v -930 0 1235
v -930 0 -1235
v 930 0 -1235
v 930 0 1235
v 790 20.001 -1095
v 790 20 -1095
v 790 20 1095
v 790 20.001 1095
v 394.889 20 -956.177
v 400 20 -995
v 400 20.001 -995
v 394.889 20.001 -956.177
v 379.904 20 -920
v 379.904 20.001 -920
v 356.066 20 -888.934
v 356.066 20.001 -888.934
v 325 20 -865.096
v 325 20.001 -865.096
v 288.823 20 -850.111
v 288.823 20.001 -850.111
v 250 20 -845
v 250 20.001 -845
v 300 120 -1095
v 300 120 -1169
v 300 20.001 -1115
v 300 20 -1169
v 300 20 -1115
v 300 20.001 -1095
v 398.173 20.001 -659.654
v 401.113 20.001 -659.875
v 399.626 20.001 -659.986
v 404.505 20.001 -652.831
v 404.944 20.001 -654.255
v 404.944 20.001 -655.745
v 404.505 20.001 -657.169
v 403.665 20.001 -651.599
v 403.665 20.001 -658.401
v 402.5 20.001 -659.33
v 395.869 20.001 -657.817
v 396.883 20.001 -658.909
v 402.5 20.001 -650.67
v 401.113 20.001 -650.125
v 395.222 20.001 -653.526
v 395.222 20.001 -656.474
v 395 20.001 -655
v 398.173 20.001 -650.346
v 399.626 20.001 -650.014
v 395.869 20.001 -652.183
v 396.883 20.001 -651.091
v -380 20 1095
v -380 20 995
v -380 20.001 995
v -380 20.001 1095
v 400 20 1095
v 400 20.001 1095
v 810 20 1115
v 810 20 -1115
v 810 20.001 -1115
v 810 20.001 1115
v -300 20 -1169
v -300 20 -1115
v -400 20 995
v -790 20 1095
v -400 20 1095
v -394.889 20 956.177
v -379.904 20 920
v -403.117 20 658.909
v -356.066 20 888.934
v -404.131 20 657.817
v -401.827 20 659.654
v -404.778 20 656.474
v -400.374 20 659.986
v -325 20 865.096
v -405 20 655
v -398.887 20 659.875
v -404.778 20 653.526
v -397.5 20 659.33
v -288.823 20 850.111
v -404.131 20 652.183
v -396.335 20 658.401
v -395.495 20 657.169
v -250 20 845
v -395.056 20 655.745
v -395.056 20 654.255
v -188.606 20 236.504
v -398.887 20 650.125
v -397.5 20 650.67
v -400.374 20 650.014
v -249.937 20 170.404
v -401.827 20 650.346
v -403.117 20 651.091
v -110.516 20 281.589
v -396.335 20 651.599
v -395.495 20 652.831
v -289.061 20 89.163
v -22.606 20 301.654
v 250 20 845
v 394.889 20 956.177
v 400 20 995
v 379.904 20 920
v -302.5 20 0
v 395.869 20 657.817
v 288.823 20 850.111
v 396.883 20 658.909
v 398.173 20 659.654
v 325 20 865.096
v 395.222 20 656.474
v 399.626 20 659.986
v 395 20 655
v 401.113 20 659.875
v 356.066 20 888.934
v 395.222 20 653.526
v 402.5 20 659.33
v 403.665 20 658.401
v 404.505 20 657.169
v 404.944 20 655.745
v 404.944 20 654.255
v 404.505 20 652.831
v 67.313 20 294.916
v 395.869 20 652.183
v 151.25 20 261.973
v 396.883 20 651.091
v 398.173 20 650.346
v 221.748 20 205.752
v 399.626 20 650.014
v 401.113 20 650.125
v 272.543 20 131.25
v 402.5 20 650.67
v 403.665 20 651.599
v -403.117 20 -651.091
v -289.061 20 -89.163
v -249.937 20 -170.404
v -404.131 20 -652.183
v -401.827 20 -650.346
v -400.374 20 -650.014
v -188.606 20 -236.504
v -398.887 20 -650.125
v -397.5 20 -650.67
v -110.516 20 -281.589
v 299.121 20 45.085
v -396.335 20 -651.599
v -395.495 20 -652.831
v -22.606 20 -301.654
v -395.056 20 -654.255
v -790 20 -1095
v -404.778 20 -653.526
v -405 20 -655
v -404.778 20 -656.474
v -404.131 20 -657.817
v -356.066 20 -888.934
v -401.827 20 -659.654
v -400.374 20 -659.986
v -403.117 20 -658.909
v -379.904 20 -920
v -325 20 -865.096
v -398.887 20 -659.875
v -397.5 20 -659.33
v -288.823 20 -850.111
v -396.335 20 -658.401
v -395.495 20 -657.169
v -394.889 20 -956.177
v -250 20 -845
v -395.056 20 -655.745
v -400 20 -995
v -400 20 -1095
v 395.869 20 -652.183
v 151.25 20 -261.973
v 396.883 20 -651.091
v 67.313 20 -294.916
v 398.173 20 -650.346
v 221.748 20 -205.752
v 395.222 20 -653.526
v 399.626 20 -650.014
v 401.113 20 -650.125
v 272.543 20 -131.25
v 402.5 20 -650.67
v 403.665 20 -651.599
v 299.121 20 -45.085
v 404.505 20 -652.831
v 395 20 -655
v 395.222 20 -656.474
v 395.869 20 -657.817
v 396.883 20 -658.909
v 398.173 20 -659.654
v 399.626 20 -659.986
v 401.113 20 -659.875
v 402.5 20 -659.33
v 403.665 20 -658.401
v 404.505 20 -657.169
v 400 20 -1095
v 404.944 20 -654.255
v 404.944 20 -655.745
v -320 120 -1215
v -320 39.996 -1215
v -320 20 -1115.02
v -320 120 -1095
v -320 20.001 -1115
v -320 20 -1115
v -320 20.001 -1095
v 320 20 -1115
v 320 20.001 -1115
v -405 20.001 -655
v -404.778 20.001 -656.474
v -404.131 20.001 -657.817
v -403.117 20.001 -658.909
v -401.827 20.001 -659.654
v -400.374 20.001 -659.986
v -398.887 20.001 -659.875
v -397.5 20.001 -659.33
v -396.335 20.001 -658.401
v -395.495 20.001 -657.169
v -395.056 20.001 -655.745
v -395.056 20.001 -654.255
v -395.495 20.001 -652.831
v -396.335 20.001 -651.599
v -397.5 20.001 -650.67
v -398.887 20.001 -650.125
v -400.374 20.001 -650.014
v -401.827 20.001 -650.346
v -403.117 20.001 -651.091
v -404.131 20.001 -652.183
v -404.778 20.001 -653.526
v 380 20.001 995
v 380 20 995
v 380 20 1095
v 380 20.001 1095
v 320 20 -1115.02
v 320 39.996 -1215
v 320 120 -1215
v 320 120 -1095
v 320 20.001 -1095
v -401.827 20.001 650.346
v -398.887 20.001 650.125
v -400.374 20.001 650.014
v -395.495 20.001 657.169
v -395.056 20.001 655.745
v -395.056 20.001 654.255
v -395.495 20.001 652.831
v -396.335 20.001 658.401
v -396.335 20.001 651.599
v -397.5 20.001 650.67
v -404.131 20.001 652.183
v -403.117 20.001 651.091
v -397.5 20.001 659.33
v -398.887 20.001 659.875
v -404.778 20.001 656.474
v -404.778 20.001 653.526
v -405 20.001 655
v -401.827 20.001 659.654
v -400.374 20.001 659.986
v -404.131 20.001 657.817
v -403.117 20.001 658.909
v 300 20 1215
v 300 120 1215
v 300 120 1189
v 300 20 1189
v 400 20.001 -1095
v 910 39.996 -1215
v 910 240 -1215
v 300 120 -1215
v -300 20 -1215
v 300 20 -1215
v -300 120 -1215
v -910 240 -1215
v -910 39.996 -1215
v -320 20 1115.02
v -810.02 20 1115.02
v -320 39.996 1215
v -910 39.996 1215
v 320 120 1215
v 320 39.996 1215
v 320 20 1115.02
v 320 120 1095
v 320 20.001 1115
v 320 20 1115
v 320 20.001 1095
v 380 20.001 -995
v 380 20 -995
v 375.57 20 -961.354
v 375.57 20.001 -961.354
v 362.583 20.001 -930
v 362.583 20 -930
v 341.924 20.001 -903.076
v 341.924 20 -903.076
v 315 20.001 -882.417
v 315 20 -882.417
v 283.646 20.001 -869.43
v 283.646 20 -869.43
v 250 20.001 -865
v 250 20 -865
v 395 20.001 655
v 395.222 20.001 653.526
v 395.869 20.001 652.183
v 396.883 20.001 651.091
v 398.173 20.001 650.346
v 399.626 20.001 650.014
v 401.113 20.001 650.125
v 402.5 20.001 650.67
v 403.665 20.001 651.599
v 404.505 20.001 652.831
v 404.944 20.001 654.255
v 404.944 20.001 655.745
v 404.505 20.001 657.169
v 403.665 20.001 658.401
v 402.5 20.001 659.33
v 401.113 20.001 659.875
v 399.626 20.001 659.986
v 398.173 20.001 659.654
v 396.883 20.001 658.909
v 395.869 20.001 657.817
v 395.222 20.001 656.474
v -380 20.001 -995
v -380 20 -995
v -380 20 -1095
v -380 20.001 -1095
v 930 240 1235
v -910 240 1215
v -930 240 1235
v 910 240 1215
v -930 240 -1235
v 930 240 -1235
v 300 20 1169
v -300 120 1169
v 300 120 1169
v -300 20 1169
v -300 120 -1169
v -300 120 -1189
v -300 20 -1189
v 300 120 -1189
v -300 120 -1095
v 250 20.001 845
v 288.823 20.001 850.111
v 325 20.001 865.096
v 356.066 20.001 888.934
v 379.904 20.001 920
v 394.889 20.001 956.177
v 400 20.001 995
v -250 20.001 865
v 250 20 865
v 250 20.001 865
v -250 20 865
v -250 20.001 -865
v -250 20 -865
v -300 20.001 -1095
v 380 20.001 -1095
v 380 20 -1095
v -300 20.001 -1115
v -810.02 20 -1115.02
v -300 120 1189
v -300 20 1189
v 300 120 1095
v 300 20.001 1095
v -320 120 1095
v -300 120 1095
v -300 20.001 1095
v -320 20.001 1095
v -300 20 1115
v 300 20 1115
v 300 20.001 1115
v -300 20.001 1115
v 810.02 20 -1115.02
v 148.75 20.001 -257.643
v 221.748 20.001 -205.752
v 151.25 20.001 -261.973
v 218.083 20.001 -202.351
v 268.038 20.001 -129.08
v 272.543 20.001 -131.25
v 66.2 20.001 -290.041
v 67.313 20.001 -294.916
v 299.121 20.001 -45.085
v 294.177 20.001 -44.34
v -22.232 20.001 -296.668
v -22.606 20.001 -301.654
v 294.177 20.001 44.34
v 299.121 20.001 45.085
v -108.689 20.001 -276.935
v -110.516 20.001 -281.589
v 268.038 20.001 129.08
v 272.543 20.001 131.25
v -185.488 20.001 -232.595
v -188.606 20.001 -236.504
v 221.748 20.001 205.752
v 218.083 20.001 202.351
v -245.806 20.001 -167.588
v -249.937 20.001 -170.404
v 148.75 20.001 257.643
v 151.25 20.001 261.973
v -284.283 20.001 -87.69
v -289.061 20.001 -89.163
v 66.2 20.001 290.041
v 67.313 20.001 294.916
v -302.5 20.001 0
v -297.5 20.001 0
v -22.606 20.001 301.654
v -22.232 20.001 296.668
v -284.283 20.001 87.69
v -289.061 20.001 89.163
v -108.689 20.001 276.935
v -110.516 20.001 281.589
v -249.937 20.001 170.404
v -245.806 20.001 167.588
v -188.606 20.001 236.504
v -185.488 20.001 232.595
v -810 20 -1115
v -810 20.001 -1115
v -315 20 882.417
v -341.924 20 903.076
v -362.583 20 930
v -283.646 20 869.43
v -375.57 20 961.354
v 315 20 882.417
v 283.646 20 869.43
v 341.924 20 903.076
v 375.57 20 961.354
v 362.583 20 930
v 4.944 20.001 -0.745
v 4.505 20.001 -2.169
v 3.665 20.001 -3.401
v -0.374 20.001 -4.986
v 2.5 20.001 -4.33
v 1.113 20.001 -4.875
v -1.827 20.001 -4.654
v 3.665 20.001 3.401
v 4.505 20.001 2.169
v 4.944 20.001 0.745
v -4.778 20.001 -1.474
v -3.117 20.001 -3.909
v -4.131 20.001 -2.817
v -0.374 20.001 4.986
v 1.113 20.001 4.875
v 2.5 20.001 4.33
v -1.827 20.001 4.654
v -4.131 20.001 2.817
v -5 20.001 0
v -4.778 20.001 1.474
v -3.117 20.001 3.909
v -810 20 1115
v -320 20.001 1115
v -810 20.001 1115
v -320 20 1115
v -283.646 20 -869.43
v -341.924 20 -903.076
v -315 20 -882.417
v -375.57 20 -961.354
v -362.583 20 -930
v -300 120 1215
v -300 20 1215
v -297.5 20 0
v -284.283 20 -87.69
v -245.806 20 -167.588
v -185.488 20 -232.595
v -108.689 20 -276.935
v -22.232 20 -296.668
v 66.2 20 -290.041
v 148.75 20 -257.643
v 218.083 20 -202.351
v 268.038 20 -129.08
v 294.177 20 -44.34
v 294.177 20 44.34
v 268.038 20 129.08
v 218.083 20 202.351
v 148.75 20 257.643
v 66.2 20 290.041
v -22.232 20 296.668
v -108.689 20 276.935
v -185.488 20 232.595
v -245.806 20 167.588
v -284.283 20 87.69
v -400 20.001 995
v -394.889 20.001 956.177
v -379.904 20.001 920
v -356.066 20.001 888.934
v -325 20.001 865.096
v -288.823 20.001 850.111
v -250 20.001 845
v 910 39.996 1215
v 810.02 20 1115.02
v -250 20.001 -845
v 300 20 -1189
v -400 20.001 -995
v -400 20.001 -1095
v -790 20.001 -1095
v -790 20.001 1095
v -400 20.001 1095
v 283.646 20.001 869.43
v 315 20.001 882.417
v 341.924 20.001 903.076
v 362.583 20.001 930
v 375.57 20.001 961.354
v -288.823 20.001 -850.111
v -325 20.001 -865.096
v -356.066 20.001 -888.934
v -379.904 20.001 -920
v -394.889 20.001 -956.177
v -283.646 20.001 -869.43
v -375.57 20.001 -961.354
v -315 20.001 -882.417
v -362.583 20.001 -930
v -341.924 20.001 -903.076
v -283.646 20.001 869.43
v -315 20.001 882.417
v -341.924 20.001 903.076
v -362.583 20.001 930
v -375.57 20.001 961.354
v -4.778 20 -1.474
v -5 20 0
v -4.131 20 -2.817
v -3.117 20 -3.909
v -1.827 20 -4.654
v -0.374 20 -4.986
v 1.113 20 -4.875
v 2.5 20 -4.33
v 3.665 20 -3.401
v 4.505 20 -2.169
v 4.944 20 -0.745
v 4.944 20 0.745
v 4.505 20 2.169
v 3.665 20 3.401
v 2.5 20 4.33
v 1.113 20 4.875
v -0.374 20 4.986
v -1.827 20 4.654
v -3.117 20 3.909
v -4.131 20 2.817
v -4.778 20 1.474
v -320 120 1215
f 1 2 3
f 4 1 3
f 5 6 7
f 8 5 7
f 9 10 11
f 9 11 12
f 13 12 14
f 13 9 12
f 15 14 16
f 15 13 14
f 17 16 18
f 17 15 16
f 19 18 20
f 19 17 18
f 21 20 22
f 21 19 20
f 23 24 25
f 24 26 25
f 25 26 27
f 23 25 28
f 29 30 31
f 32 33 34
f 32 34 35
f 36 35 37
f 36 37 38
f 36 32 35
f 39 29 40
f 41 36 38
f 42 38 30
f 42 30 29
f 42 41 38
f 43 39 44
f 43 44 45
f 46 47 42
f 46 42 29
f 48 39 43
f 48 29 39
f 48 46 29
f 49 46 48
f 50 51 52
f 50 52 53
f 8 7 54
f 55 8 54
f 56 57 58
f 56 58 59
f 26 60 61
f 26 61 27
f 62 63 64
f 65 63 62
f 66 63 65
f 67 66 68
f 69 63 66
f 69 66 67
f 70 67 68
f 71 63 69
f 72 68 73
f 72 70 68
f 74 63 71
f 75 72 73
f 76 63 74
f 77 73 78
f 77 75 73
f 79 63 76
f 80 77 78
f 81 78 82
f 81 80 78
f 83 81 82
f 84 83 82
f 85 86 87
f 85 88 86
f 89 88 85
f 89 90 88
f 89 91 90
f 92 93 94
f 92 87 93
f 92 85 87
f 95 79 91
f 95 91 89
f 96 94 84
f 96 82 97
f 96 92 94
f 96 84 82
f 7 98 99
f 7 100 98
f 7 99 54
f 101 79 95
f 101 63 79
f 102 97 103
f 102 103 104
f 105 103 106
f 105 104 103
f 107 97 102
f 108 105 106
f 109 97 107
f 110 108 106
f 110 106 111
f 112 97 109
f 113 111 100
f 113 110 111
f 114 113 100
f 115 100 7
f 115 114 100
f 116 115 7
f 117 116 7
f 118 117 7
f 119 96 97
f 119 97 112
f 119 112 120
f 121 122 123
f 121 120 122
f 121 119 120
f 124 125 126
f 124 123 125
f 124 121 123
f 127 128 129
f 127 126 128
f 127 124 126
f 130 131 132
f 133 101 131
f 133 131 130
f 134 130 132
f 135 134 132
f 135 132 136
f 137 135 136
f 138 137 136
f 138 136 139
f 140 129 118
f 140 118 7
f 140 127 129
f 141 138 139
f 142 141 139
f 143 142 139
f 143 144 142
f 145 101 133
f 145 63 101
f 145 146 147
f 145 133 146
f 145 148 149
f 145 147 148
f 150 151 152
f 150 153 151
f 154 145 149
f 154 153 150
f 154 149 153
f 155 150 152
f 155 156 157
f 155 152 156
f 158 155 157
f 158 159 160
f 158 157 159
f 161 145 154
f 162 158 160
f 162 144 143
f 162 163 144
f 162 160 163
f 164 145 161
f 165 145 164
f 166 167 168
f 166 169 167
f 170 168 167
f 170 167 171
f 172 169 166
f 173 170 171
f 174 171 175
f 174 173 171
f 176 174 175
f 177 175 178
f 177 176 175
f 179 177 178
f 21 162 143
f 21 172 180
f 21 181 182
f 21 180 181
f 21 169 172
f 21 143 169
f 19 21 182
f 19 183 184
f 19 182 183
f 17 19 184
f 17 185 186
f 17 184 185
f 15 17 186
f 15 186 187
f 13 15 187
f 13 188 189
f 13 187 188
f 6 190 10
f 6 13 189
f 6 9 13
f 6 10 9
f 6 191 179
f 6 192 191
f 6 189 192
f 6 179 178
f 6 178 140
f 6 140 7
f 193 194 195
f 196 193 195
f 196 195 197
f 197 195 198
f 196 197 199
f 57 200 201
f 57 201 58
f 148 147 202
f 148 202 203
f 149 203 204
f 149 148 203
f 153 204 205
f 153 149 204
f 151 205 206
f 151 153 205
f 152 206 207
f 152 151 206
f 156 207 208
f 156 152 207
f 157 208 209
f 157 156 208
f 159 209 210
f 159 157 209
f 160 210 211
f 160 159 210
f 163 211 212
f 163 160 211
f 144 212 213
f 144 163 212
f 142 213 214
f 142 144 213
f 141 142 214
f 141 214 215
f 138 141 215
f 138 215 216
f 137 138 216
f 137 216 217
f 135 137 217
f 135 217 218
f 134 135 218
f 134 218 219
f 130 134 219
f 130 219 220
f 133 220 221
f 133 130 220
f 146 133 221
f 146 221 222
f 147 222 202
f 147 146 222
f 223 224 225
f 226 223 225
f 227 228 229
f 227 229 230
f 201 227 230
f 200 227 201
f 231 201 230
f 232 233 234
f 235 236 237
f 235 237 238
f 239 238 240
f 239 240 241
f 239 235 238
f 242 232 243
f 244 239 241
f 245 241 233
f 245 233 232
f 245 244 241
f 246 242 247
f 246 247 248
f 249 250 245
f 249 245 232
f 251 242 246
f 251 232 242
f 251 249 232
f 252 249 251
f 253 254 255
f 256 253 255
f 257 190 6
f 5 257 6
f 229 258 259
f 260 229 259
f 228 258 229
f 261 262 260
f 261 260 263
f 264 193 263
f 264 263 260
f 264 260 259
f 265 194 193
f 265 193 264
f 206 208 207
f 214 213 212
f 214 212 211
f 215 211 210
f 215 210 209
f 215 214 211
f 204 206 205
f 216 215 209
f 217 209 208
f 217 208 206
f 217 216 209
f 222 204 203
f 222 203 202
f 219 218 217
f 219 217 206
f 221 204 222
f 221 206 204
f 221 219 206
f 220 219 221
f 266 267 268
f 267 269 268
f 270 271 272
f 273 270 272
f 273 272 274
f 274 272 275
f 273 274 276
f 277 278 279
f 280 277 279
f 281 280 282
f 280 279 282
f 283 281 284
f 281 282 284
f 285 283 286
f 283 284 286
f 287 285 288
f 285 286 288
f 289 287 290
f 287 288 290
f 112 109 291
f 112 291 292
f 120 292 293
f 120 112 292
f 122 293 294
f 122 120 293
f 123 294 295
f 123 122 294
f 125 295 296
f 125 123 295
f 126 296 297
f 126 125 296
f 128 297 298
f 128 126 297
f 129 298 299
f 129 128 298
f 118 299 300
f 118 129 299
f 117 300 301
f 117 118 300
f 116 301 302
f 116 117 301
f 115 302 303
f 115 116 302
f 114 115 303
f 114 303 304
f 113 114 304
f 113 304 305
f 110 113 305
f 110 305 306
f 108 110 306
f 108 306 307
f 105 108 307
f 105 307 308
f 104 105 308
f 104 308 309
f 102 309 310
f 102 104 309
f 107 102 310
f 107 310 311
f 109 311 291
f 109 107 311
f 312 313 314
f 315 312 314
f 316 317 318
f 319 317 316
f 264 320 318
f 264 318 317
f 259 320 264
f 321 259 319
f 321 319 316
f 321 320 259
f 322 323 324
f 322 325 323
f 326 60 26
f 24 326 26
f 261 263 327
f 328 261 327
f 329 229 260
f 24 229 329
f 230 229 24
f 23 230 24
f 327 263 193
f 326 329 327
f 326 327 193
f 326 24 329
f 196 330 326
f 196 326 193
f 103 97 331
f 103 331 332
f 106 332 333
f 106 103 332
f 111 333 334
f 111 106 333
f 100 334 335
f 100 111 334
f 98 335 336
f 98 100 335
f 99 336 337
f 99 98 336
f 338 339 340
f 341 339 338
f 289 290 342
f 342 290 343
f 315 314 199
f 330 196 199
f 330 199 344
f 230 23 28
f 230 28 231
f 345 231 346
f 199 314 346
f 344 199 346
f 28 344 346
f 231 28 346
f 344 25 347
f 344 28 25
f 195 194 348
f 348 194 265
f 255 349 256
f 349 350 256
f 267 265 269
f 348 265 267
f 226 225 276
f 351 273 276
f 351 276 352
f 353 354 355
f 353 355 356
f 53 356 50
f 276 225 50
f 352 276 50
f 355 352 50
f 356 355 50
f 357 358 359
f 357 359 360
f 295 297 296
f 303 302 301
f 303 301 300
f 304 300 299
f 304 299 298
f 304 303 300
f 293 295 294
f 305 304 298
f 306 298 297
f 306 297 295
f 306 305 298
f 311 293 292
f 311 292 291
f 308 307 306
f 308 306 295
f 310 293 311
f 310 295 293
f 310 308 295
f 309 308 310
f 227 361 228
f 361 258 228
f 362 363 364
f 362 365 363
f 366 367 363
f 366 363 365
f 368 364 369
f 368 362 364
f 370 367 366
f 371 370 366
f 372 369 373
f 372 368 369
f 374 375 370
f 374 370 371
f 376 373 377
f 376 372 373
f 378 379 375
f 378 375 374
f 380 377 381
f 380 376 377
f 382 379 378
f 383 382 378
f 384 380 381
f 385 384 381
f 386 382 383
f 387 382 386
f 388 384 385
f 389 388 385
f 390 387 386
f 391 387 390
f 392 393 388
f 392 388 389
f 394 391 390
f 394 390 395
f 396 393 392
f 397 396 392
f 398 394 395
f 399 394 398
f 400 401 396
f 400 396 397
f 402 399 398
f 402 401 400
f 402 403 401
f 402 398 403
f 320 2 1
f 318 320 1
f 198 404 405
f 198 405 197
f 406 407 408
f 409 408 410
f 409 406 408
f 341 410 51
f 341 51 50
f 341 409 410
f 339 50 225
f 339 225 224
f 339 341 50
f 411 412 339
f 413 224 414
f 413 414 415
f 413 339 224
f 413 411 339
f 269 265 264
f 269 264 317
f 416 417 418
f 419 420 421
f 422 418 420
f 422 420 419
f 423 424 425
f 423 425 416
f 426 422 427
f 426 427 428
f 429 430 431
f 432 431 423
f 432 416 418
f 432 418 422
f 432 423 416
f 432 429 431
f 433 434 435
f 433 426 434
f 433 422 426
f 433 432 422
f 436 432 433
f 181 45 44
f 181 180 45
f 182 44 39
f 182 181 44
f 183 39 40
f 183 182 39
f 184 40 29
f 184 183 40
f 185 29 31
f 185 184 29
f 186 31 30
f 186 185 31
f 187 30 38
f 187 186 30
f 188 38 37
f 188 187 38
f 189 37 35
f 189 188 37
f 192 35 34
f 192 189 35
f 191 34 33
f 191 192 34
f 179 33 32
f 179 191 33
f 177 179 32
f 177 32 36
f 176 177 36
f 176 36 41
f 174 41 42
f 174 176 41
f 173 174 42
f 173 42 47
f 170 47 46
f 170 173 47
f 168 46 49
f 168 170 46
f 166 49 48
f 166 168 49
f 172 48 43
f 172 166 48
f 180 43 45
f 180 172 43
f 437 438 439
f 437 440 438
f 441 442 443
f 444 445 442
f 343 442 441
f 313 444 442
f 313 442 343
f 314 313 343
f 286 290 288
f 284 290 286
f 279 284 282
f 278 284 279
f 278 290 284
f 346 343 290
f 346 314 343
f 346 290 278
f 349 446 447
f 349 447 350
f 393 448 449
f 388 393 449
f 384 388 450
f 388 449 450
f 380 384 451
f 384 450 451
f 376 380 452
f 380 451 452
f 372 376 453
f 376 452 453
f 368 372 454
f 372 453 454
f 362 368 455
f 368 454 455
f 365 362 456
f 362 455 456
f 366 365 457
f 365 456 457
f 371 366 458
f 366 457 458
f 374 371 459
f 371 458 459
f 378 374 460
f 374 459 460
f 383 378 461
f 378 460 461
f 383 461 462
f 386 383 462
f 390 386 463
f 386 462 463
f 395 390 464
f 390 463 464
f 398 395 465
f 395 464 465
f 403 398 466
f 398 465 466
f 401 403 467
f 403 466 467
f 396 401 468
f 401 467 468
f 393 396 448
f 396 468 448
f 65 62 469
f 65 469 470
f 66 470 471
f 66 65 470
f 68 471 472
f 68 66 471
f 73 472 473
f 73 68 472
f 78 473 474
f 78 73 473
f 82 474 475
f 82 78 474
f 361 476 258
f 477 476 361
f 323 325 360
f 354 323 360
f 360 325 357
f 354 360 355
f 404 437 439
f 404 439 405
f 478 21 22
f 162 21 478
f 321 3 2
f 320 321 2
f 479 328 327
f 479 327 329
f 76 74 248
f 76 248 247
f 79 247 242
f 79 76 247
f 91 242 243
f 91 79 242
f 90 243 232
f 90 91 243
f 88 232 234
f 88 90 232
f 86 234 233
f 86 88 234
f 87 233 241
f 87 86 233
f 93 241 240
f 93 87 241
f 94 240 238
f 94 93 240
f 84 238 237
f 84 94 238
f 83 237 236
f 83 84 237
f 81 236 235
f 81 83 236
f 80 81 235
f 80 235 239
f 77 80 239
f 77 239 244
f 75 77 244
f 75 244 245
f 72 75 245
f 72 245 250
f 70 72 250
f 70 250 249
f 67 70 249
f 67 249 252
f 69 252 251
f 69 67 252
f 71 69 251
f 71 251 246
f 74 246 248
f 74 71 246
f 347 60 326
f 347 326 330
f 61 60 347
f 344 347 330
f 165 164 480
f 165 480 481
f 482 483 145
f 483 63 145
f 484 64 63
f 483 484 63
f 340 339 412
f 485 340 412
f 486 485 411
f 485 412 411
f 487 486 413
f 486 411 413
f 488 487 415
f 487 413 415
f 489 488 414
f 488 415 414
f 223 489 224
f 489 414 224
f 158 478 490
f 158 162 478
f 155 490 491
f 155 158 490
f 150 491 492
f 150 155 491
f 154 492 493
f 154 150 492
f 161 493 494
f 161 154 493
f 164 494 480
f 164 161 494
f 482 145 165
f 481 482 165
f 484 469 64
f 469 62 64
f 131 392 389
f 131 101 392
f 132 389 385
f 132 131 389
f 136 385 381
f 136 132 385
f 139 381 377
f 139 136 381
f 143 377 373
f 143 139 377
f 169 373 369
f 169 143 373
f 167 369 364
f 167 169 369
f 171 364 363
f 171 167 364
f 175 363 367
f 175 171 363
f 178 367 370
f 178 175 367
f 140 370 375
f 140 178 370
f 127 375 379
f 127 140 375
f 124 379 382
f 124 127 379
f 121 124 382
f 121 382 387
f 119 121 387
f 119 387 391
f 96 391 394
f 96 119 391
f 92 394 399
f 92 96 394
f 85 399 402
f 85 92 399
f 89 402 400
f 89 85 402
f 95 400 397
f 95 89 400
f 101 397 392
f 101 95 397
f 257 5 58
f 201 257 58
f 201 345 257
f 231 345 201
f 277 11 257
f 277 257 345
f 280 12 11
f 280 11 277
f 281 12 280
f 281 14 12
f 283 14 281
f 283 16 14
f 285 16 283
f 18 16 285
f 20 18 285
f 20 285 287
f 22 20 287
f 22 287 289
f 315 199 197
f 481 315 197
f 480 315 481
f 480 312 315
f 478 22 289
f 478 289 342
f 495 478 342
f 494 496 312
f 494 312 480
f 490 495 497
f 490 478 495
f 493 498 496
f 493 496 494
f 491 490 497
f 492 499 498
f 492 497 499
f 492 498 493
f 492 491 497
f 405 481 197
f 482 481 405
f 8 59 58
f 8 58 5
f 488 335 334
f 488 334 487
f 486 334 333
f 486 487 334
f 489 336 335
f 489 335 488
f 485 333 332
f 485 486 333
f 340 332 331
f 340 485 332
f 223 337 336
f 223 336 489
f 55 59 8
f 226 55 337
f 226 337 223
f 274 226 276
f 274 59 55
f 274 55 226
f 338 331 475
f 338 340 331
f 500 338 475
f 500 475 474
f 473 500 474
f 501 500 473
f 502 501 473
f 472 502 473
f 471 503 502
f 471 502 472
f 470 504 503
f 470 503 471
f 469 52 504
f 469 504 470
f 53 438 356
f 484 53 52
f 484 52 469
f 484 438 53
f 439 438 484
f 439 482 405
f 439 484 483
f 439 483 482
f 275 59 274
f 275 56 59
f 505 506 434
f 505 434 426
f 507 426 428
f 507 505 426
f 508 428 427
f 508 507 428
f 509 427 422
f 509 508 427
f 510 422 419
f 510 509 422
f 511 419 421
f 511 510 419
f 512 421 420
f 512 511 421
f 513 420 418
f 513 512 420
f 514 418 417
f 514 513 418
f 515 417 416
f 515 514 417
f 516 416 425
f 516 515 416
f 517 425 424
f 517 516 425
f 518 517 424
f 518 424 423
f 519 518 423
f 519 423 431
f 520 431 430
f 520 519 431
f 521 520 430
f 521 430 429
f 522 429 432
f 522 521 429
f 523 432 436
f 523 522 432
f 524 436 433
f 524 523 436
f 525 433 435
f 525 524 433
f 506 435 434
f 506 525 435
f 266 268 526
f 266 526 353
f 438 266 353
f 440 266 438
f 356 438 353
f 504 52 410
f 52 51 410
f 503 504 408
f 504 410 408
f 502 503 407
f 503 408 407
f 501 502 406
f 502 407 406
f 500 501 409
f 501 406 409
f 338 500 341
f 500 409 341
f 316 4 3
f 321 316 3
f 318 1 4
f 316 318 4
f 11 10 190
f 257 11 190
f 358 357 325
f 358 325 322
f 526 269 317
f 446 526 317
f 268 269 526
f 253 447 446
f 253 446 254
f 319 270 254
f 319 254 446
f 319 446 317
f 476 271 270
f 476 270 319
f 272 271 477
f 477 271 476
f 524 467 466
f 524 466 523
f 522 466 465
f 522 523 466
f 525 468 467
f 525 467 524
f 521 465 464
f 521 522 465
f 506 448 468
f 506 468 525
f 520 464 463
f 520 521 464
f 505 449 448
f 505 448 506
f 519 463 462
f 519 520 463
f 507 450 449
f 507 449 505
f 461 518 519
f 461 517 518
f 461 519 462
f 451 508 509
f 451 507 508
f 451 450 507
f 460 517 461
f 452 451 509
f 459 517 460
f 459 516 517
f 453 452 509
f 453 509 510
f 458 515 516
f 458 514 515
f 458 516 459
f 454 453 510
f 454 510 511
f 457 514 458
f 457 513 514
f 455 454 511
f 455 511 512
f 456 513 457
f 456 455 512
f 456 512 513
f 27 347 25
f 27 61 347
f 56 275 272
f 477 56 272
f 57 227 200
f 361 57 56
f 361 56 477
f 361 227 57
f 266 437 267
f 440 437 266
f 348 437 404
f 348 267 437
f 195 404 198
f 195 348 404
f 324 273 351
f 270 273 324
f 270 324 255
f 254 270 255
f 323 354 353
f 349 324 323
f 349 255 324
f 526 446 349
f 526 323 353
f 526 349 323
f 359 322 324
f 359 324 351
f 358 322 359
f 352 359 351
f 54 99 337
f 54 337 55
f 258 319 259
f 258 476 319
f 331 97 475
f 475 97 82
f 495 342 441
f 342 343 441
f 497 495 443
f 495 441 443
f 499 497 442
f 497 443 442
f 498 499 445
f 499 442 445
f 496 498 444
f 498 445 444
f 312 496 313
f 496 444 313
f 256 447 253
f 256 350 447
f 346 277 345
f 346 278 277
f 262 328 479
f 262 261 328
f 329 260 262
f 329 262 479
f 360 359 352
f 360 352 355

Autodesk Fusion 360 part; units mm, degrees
sketch "スケッチ1" plane through (0, 0, 0) normal (0, 1, 0) x (1, 0, 0)
  line L0 (-910, -1215) -> (910, -1215)
  line L1 (910, -1215) -> (910, 1215)
  line L2 (910, 1215) -> (-910, 1215)
  line L3 (-910, 1215) -> (-910, -1215)
  line L4 (930, 1235) -> (-930, 1235)
  line L5 (-930, 1235) -> (-930, -1235)
  line L6 (-930, -1235) -> (930, -1235)
  line L7 (930, -1235) -> (930, 1235)
extrude "押し出し1" add sketch "スケッチ1" along normal blind 20 contours L0 L1 L2 L3 | L4 L5 L6 L7
extrude "押し出し2" add sketch "スケッチ1" along normal blind 240
sketch "スケッチ2" plane through (0, 20, 0) normal (0, 1, 0) x (-1, 0, 0)
  line L0 (910, 1215) -> (-910, 1215)
  line L1 (-910, 1215) -> (-910, -1215)
  line L2 (-910, -1215) -> (910, -1215)
  line L3 (910, -1215) -> (910, 1215)
  line L4 (910, -1215) -> (-910, -1215)
  line L5 (-910, -1215) -> (-910, 1215)
  line L6 (-910, 1215) -> (910, 1215)
  line L7 (910, 1215) -> (910, -1215)
  line L8 (-810, -1115) -> (-810, 1115)
  line L9 (810, 1115) -> (810, -1115)
  line L10 (790, -1095) -> (-790, -1095)
  line L11 (-790, -1095) -> (-790, 1095)
  line L12 (-790, 1095) -> (790, 1095)
  line L13 (790, 1095) -> (790, -1095)
  circle A0 centre (400, -655) radius 5
  circle A1 centre (-400, -655) radius 5
  circle A2 centre (400, 655) radius 5
  circle A3 centre (-400, 655) radius 5
  circle A4 centre (0, 0) radius 5
  circle A5 centre (0, 0) radius 302.5
  circle A6 centre (0, 0) radius 297.5
  line L14 (-250, 845) -> (250, 845)
  line L15 (400, 995) -> (400, 1095)
  line L16 (-400, 995) -> (-400, 1095)
  arc A7 (250, 845) -> (400, 995) centre (250, 995) ccw
  arc A8 (-400, 995) -> (-250, 845) centre (-250, 995) ccw
  line L17 (-380, 995) -> (-380, 1095)
  arc A9 (-380, 995) -> (-250, 865) centre (-250, 995) ccw
  line L18 (-250, 865) -> (250, 865)
  arc A10 (250, 865) -> (380, 995) centre (250, 995) ccw
  line L19 (380, 995) -> (380, 1095)
  line L20 (300, 1169) -> (-300, 1169)
  line L21 (320, 1215) -> (320, 1095)
  line L22 (300, 1189) -> (-300, 1189)
  line L23 (-320, 1215) -> (-320, 1095)
  line L24 (-300, 1215) -> (-300, 1189)
  line L25 (-300, 1169) -> (-300, 1095)
  line L26 (300, 1215) -> (300, 1189)
  line L27 (300, 1169) -> (300, 1095)
  line L28 (320, 1115) -> (810, 1115)
  line L29 (-810, 1115) -> (-320, 1115)
  line L30 (-300, 1115) -> (300, 1115)
  line L31 (300, -1215) -> (300, -1189)
  line L32 (300, -1189) -> (-300, -1189)
  line L33 (-300, -1215) -> (-300, -1189)
  line L34 (300, -1169) -> (300, -1095)
  line L35 (-300, -1169) -> (-300, -1095)
  line L36 (300, -1169) -> (-300, -1169)
  line L37 (320, -1215) -> (320, -1095)
  line L38 (-320, -1215) -> (-320, -1095)
  line L39 (810, -1115) -> (320, -1115)
  line L40 (300, -1115) -> (-300, -1115)
  line L41 (-320, -1115) -> (-810, -1115)
  line L42 (380, -995) -> (380, -1095)
  arc A11 (380, -995) -> (250, -865) centre (250, -995) ccw
  line L43 (-250, -865) -> (250, -865)
  arc A12 (-250, -865) -> (-380, -995) centre (-250, -995) ccw
  line L44 (-380, -995) -> (-380, -1095)
  line L45 (400, -995) -> (400, -1095)
  arc A13 (400, -995) -> (250, -845) centre (250, -995) ccw
  line L46 (-250, -845) -> (250, -845)
  arc A14 (-250, -845) -> (-400, -995) centre (-250, -995) ccw
  line L47 (-400, -995) -> (-400, -1095)
extrude "押し出し3" add sketch "スケッチ2" along normal blind 100 contours L0 L6 L12 L20 L21 L22 L23 L24 L25 L26 L27 | L2 L4 L10 L31 L32 L33 L34 L35 L36 L37 L38
extrude "押し出し4" add sketch "スケッチ2" along normal blind 0.001 contours L9 L10 L12 L13 L21 L28 L37 L39 | L12 L25 L27 L30 | L12 L14 L15 L16 A7 A8 L17 A9 L18 A10 L19 | L8 L10 L11 L12 L23 L29 L38 L41 | L10 L42 A11 L43 A12 L44 L45 A13 L46 A14 L47 | L10 L34 L35 L40 | A0 | A1 | A2 | A3 | A4 | A5
chamfer "面取り1" distance 100 distance2 20 6 edges at (615, 20, -1215) (-615, 20, -1215) (-910, 20, 0) (615, 20, 1215) (-615, 20, 1215) (910, 20, 0) measured on face at (876.6667, 20, 371.6667) measured on face at (-876.6667, 20, 371.6667) measured on face at (-876.6667, 20, 371.6667) measured on face at (876.6667, 20, 371.6667) measured on face at (-876.6667, 20, 371.6667) measured on face at (876.6667, 20, 371.6667)
equation "d6 = 20 mm + 220 mm"
